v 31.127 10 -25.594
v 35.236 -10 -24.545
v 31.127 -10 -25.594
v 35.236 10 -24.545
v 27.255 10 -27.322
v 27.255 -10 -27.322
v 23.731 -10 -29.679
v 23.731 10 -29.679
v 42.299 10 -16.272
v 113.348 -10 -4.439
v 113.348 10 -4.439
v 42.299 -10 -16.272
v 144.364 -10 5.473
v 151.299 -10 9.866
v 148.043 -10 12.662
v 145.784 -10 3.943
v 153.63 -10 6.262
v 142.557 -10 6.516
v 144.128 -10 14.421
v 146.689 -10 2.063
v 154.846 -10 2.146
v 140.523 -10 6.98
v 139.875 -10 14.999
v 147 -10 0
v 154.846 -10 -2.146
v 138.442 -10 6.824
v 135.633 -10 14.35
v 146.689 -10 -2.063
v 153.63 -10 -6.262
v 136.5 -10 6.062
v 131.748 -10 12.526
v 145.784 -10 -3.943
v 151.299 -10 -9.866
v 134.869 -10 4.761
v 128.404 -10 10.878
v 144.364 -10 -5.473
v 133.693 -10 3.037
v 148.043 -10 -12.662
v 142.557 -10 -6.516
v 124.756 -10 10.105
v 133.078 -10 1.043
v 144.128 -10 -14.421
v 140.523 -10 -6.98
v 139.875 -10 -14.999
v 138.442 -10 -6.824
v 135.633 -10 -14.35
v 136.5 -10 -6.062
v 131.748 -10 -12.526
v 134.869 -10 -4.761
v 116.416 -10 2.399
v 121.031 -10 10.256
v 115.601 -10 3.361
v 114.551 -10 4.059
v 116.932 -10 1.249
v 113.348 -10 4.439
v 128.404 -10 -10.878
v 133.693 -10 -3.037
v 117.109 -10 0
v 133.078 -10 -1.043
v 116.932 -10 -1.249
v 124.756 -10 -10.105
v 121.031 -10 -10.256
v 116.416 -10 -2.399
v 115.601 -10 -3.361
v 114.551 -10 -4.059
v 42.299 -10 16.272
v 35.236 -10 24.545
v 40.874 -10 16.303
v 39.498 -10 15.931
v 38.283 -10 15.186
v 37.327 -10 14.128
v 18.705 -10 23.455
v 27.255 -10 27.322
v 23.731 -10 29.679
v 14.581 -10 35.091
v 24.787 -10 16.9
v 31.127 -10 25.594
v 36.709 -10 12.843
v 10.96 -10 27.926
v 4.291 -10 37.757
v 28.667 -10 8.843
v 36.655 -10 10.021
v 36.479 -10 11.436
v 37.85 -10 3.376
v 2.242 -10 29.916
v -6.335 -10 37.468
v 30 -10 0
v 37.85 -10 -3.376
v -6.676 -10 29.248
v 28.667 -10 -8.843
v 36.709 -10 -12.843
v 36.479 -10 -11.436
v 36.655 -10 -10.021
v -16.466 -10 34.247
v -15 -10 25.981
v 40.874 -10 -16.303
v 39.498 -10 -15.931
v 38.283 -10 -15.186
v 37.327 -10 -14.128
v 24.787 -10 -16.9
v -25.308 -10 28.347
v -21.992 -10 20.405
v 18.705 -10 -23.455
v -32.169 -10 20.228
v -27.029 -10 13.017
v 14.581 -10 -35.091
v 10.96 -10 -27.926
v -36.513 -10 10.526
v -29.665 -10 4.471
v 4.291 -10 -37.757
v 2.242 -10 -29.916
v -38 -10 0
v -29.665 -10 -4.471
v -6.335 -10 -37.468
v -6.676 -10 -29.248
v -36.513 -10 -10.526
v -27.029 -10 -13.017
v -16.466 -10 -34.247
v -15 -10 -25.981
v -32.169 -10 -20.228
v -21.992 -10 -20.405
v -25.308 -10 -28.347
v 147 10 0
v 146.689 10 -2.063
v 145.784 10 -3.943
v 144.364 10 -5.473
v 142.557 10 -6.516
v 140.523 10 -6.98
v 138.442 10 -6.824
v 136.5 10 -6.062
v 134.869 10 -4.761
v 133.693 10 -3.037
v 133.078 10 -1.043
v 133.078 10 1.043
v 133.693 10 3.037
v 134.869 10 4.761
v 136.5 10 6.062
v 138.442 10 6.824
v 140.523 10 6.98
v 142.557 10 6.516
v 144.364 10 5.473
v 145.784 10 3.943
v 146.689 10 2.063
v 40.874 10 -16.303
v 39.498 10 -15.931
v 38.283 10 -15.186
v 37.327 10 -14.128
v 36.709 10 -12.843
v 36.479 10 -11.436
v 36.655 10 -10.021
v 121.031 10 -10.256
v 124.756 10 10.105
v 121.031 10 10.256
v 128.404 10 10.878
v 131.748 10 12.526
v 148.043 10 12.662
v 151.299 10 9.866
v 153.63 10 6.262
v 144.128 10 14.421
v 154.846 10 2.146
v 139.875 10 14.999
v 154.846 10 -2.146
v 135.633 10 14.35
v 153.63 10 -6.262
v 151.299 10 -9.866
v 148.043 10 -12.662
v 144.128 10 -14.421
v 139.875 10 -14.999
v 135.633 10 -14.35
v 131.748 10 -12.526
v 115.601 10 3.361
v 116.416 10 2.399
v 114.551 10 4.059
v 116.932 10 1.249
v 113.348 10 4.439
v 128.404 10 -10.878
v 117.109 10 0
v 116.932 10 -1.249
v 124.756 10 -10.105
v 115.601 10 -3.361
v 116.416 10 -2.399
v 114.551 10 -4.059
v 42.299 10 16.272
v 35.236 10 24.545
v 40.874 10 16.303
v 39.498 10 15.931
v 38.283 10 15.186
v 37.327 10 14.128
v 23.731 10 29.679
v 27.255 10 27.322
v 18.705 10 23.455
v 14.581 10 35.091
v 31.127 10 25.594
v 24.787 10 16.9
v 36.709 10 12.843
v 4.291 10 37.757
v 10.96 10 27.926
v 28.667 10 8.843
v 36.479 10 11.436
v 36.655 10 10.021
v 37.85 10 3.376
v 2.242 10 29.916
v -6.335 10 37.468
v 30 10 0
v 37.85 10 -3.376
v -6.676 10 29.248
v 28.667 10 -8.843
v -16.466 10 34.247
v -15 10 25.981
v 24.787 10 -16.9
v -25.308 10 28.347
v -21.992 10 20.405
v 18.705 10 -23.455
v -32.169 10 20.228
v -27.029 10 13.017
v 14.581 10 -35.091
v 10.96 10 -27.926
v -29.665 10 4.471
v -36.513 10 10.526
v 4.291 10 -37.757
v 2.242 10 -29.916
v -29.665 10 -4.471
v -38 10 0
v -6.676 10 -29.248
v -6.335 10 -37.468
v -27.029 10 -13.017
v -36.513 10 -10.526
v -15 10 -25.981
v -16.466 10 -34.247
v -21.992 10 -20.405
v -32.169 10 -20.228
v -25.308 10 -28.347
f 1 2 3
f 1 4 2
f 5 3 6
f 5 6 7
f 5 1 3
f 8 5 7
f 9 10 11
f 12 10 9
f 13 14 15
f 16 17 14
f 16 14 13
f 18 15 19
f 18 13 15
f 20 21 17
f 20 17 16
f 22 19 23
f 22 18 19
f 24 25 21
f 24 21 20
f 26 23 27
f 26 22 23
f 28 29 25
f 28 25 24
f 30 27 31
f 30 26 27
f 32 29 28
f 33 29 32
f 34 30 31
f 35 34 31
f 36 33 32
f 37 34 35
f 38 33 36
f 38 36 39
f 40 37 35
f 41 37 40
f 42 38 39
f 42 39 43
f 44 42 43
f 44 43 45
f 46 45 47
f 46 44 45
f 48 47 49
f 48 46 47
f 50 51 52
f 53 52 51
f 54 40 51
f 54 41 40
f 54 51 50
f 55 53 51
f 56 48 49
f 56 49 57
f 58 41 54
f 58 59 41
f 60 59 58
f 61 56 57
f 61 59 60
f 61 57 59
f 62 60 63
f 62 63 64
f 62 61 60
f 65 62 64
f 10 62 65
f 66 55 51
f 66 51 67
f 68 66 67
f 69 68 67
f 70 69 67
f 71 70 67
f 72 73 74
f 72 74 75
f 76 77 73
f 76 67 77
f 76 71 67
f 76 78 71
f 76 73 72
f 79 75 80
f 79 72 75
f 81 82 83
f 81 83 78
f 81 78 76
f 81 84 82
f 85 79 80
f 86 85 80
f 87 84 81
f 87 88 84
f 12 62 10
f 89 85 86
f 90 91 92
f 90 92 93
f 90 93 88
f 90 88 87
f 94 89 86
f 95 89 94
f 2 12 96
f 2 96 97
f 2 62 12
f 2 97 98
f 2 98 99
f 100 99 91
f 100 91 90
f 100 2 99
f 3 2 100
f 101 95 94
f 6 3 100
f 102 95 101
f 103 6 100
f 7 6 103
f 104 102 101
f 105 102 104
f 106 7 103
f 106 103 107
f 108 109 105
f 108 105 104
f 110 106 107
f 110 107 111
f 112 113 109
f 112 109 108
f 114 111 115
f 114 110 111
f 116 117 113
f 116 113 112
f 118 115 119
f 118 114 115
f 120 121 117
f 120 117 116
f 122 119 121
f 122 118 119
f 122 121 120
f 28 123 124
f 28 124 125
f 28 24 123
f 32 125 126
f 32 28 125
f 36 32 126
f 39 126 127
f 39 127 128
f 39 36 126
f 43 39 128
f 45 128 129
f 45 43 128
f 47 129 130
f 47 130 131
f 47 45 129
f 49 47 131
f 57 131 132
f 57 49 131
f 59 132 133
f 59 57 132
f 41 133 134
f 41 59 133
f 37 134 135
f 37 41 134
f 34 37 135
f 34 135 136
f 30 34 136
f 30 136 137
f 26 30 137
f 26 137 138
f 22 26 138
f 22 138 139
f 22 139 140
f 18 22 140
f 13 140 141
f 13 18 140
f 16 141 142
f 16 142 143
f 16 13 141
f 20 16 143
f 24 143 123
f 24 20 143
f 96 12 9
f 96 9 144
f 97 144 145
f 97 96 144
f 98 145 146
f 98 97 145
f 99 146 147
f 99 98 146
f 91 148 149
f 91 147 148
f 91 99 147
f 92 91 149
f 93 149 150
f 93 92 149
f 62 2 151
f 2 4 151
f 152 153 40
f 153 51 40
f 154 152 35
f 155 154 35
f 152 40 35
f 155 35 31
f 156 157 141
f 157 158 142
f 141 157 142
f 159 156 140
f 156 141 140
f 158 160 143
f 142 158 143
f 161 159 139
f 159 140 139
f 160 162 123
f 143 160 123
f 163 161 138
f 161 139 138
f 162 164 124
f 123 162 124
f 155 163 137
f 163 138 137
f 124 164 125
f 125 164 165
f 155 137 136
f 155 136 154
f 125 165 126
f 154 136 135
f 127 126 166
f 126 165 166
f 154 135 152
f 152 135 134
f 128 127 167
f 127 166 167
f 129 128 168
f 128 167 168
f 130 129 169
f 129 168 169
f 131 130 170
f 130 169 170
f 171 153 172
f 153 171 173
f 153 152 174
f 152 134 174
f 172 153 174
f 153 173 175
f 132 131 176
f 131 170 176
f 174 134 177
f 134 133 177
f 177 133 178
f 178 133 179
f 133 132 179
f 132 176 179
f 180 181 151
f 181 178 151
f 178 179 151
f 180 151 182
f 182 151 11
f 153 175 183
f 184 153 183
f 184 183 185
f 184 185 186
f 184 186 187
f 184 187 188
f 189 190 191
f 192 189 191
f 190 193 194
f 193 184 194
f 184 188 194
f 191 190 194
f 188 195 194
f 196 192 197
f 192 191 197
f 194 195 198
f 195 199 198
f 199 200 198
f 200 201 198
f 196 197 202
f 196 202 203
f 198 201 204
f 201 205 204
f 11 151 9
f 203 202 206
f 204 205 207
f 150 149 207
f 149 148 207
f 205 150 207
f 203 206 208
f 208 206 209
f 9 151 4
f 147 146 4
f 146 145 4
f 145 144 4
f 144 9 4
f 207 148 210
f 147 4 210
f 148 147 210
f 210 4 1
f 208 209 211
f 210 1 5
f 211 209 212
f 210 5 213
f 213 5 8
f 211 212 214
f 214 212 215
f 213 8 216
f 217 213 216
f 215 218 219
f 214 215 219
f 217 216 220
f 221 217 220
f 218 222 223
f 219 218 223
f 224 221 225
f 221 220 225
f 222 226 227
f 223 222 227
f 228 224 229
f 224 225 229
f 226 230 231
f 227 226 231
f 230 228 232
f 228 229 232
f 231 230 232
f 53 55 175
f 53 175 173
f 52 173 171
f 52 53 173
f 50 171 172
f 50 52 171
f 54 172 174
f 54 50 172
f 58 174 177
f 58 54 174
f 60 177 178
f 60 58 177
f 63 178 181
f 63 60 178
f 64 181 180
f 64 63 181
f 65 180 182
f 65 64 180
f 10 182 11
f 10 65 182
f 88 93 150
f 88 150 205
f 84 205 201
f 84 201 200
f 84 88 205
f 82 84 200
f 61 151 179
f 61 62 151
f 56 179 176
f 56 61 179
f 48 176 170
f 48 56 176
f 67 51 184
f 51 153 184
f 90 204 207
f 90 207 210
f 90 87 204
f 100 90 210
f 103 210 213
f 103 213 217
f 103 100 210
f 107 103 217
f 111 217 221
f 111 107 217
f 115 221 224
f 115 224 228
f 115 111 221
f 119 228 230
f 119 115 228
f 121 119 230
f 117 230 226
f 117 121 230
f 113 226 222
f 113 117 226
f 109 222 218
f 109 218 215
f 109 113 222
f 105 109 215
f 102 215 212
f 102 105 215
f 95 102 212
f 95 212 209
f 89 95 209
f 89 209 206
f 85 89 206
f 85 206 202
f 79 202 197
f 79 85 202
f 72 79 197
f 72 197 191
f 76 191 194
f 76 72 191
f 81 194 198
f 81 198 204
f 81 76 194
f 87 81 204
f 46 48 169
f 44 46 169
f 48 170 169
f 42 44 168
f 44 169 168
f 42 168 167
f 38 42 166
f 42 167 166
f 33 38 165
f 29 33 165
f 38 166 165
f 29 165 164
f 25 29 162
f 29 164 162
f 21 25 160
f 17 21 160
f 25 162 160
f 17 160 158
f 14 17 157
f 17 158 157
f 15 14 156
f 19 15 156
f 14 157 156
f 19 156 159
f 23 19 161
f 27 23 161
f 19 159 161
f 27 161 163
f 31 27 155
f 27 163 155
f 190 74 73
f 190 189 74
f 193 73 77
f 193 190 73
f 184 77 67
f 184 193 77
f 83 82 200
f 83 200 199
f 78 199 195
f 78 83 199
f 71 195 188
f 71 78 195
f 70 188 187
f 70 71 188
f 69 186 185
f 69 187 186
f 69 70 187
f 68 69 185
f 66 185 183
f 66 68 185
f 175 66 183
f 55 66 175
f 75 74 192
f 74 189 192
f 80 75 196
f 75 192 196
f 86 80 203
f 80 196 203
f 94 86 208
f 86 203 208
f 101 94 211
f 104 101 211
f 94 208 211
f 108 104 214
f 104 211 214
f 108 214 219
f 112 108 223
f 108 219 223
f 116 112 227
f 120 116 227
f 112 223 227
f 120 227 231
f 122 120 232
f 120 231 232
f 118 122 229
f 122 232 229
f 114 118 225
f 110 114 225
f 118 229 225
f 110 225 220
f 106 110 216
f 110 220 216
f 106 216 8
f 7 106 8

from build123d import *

# Parameters (mm, degrees)
SKETCH1_R           = 30
SKETCH1_R_2         = 7
BOSS_EXTRUDE1_DEPTH = 10
FILLET1_R           = 15
FILLET2_R           = 25
CUT_EXTRUDE1_DEPTH  = 21


with BuildPart() as part:
    # Sketch1 → Boss-Extrude1 (new body, symmetric)
    with BuildSketch(Plane(origin=(0, 0, 0), x_dir=(1, 0, 0), z_dir=(0, 1, 0))):
        with BuildLine():
            Line((27.935473676, 25.760615491), (128.063755469, 9.084385863))
            ThreePointArc((128.063755469, 9.084385863), (155, 0), (128.063755469, -9.084385863))
            Line((128.063755469, -9.084385863), (27.935473676, -25.760615491))
            ThreePointArc((27.935473676, -25.760615491), (-38, 0), (27.935473676, 25.760615491))
        make_face()
        Circle(SKETCH1_R, mode=Mode.SUBTRACT)
        with Locations((140, 0)):
            Circle(SKETCH1_R_2, mode=Mode.SUBTRACT)
    extrude(amount=BOSS_EXTRUDE1_DEPTH, both=True)

    # Fillet1
    fillet1_edges = [part.edges().sort_by_distance(p)[0] for p in [
        (128.063755469, 0, -9.084385863),
        (128.063755469, 0, 9.084385863),
    ]]
    fillet(fillet1_edges, radius=FILLET1_R)

    # Fillet2
    fillet2_edges = [part.edges().sort_by_distance(p)[0] for p in [
        (27.935473676, 0, -25.760615491),
        (27.935473676, 0, 25.760615491),
    ]]
    fillet(fillet2_edges, radius=FILLET2_R)

    # Sketch2 → Cut-Extrude1 (cut, through all)
    with BuildSketch(Plane.XZ.offset(10)):
        with BuildLine():
            Line((42.299222529, 16.271932074), (113.347981366, 4.438857582))
            ThreePointArc((113.347981366, 4.438857582), (117.108695652, 0), (113.347981366, -4.438857582))
            Line((113.347981366, -4.438857582), (42.299222529, -16.271932074))
            ThreePointArc((42.299222529, -16.271932074), (37.766889928, -14.690866644), (36.65479466, -10.021278781))
            ThreePointArc((36.65479466, -10.021278781), (38, 0), (36.65479466, 10.021278781))
            ThreePointArc((36.65479466, 10.021278781), (37.766889928, 14.690866644), (42.299222529, 16.271932074))
        make_face()
    extrude(amount=-CUT_EXTRUDE1_DEPTH, mode=Mode.SUBTRACT)


solid = part.part
